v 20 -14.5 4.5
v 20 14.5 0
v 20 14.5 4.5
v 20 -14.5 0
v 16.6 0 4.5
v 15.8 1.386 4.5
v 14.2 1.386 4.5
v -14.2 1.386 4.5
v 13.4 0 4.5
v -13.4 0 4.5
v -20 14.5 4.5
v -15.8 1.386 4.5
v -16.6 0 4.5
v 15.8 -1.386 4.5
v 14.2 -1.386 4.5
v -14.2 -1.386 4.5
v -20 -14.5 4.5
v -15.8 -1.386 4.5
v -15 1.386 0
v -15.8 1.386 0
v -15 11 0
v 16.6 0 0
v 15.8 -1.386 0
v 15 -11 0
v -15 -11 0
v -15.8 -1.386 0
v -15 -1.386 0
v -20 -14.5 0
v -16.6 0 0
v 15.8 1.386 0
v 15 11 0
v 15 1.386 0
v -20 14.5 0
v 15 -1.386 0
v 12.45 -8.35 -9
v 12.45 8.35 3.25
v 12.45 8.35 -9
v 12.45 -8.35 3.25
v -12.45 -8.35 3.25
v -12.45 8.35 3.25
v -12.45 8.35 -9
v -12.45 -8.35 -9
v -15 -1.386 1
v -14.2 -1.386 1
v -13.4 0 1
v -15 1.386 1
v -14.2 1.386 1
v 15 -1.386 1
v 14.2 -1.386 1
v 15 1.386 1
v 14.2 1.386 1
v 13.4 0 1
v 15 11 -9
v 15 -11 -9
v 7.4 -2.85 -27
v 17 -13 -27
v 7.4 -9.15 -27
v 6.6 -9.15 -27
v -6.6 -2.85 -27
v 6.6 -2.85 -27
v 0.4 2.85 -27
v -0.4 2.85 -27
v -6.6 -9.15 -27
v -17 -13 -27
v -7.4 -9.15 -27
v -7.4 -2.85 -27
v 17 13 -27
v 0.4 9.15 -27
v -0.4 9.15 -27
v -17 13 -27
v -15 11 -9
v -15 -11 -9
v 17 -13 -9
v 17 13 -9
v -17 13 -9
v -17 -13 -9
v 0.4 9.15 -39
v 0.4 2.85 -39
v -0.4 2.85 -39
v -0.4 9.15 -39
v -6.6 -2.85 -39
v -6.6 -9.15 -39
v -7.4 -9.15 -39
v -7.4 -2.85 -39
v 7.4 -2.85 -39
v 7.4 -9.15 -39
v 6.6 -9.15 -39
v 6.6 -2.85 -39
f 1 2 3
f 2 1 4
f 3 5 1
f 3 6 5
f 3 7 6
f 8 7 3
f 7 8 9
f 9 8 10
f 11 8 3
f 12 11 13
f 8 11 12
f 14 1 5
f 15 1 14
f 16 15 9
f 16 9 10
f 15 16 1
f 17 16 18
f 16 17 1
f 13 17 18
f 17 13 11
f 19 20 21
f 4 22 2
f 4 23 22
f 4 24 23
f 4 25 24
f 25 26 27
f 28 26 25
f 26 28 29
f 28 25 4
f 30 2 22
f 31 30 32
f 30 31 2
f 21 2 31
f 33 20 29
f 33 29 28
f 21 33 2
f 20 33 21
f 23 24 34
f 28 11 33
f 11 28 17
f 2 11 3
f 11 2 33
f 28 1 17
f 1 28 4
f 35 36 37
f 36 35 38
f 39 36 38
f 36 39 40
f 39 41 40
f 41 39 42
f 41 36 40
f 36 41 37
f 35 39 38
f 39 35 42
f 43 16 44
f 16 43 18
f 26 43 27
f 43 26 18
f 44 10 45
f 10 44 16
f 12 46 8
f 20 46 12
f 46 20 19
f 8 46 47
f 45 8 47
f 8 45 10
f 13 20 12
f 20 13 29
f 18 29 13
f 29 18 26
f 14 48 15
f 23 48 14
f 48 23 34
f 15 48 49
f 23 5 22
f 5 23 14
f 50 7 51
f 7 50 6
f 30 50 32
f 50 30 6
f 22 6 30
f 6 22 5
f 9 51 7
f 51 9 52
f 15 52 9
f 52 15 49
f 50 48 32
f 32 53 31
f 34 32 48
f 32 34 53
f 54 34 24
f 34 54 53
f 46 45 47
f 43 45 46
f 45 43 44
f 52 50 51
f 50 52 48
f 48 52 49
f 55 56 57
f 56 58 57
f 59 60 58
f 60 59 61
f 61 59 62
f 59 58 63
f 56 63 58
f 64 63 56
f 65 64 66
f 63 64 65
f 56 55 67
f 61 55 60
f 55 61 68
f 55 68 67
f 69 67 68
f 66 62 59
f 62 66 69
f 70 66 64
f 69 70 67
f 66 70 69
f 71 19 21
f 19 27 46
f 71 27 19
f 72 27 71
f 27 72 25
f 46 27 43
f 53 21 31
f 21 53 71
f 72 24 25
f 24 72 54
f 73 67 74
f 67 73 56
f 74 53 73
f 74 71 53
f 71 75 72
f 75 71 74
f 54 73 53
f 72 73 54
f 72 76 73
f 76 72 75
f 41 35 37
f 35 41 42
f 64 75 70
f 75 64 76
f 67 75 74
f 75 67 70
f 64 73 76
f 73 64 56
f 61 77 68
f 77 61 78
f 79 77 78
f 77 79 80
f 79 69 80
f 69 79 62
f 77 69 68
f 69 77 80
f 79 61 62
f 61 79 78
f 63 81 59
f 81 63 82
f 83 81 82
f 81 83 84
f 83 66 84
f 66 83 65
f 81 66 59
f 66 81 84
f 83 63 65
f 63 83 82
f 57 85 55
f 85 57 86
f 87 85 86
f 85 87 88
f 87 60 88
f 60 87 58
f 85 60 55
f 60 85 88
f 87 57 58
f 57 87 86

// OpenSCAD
// Parameters
overall_width = 40; //[20:80:0.5]
overall_height = 29; //[14.5:58:0.5]
cutout_clearance = 0.2; //[0:1:0.05]
screw_hole_diameter = 3.2; //[2:6:0.1]
screw_hole_pitch_x = 30; //[20:50:0.5]
screw_hole_pitch_y = 0; //[0:20:0.5]
flange_thickness = 2.5; //[1.2:5:0.1]
bezel_thickness = 2; //[1:4:0.1]
body_depth = 28; //[15:60:0.5]
corner_radius = 3; //[0.5:8:0.25]
filter_can_enabled = 1; //[0:1:1]
terminal_spade_width = 6.3; //[2.8:9.5:0.1]
terminal_spade_thickness = 0.8; //[0.5:1.5:0.05]
terminal_spade_length = 12; //[6:25:0.5]
terminal_spade_pitch_x = 14; //[10:20:0.5]
terminal_spade_pitch_y = 6; //[4:12:0.5]
orifice_width = 24.5; //[18:30:0.5]
orifice_height = 16.3; //[12:22:0.5]
orifice_depth = 17; //[10:25:0.5]
body_width = 30; //[20:38:0.5]
body_height = 22; //[16:28:0.5]
filter_can_width = 34; //[24:50:0.5]
filter_can_height = 26; //[18:40:0.5]
filter_can_depth = 18; //[10:35:0.5]
panel_profile_thickness = 3; //[1:10:0.5]
overlap = 1; //[0.5:2:0.1]

// IEC Module
module iec() {
  color("Black") {
    // Front Flange Bezel
    difference() {
      translate([0, 0, (flange_thickness + bezel_thickness) / 2])
        cube([overall_width, overall_height, flange_thickness + bezel_thickness], center=true);
      translate([0, 0, (flange_thickness + bezel_thickness) / 2 - (orifice_depth + flange_thickness + bezel_thickness + overlap) / 2 + overlap])
        cube([orifice_width + 2 * cutout_clearance, orifice_height + 2 * cutout_clearance, orifice_depth + flange_thickness + bezel_thickness + overlap], center=true);
      translate([-screw_hole_pitch_x / 2, -screw_hole_pitch_y / 2, (flange_thickness + bezel_thickness) / 2])
        cylinder(r=screw_hole_diameter / 2, h=flange_thickness + bezel_thickness + overlap * 2, center=true);
      translate([screw_hole_pitch_x / 2, screw_hole_pitch_y / 2, (flange_thickness + bezel_thickness) / 2])
        cylinder(r=screw_hole_diameter / 2, h=flange_thickness + bezel_thickness + overlap * 2, center=true);
    }
    
    // IEC Filtered Inlet Body
    difference() {
      translate([0, 0, -body_depth / 2 + overlap])
        cube([body_width, body_height, body_depth], center=true);
      translate([0, 0, (flange_thickness + bezel_thickness) / 2 - (orifice_depth + flange_thickness + bezel_thickness + overlap) / 2 + overlap])
        cube([orifice_width + 2 * cutout_clearance, orifice_height + 2 * cutout_clearance, orifice_depth + flange_thickness + bezel_thickness + overlap], center=true);
    }
    
    // Rear Can Filter Housing
    if (filter_can_enabled) {
      translate([0, 0, -body_depth + (filter_can_depth * filter_can_enabled) / 2 + overlap])
        cube([filter_can_width, filter_can_height, filter_can_depth * filter_can_enabled], center=true);
    }
    
    // Terminal Spades
    translate([0, terminal_spade_pitch_y, -body_depth - terminal_spade_length / 2 + overlap])
      cube([terminal_spade_thickness, terminal_spade_width, terminal_spade_length], center=true);
    translate([-terminal_spade_pitch_x / 2, -terminal_spade_pitch_y, -body_depth - terminal_spade_length / 2 + overlap])
      cube([terminal_spade_thickness, terminal_spade_width, terminal_spade_length], center=true);
    translate([terminal_spade_pitch_x / 2, -terminal_spade_pitch_y, -body_depth - terminal_spade_length / 2 + overlap])
      cube([terminal_spade_thickness, terminal_spade_width, terminal_spade_length], center=true);
  }
}

// Mod Module
module mod() {
  color("Silver") {
    // Panel Cutout Profile
    difference() {
      translate([0, 0, panel_profile_thickness / 2])
        cube([body_width + 2 * cutout_clearance, body_height + 2 * cutout_clearance, panel_profile_thickness], center=true);
      translate([0, 0, (flange_thickness + bezel_thickness) / 2 - (orifice_depth + flange_thickness + bezel_thickness + overlap) / 2 + overlap])
        cube([orifice_width + 2 * cutout_clearance, orifice_height + 2 * cutout_clearance, orifice_depth + flange_thickness + bezel_thickness + overlap], center=true);
      translate([-screw_hole_pitch_x / 2, -screw_hole_pitch_y / 2, (flange_thickness + bezel_thickness) / 2])
        cylinder(r=screw_hole_diameter / 2, h=flange_thickness + bezel_thickness + overlap * 2, center=true);
      translate([screw_hole_pitch_x / 2, screw_hole_pitch_y / 2, (flange_thickness + bezel_thickness) / 2])
        cylinder(r=screw_hole_diameter / 2, h=flange_thickness + bezel_thickness + overlap * 2, center=true);
    }
  }
}

// Assembly
module assembly() {
  iec();
  mod();
}

assembly();
